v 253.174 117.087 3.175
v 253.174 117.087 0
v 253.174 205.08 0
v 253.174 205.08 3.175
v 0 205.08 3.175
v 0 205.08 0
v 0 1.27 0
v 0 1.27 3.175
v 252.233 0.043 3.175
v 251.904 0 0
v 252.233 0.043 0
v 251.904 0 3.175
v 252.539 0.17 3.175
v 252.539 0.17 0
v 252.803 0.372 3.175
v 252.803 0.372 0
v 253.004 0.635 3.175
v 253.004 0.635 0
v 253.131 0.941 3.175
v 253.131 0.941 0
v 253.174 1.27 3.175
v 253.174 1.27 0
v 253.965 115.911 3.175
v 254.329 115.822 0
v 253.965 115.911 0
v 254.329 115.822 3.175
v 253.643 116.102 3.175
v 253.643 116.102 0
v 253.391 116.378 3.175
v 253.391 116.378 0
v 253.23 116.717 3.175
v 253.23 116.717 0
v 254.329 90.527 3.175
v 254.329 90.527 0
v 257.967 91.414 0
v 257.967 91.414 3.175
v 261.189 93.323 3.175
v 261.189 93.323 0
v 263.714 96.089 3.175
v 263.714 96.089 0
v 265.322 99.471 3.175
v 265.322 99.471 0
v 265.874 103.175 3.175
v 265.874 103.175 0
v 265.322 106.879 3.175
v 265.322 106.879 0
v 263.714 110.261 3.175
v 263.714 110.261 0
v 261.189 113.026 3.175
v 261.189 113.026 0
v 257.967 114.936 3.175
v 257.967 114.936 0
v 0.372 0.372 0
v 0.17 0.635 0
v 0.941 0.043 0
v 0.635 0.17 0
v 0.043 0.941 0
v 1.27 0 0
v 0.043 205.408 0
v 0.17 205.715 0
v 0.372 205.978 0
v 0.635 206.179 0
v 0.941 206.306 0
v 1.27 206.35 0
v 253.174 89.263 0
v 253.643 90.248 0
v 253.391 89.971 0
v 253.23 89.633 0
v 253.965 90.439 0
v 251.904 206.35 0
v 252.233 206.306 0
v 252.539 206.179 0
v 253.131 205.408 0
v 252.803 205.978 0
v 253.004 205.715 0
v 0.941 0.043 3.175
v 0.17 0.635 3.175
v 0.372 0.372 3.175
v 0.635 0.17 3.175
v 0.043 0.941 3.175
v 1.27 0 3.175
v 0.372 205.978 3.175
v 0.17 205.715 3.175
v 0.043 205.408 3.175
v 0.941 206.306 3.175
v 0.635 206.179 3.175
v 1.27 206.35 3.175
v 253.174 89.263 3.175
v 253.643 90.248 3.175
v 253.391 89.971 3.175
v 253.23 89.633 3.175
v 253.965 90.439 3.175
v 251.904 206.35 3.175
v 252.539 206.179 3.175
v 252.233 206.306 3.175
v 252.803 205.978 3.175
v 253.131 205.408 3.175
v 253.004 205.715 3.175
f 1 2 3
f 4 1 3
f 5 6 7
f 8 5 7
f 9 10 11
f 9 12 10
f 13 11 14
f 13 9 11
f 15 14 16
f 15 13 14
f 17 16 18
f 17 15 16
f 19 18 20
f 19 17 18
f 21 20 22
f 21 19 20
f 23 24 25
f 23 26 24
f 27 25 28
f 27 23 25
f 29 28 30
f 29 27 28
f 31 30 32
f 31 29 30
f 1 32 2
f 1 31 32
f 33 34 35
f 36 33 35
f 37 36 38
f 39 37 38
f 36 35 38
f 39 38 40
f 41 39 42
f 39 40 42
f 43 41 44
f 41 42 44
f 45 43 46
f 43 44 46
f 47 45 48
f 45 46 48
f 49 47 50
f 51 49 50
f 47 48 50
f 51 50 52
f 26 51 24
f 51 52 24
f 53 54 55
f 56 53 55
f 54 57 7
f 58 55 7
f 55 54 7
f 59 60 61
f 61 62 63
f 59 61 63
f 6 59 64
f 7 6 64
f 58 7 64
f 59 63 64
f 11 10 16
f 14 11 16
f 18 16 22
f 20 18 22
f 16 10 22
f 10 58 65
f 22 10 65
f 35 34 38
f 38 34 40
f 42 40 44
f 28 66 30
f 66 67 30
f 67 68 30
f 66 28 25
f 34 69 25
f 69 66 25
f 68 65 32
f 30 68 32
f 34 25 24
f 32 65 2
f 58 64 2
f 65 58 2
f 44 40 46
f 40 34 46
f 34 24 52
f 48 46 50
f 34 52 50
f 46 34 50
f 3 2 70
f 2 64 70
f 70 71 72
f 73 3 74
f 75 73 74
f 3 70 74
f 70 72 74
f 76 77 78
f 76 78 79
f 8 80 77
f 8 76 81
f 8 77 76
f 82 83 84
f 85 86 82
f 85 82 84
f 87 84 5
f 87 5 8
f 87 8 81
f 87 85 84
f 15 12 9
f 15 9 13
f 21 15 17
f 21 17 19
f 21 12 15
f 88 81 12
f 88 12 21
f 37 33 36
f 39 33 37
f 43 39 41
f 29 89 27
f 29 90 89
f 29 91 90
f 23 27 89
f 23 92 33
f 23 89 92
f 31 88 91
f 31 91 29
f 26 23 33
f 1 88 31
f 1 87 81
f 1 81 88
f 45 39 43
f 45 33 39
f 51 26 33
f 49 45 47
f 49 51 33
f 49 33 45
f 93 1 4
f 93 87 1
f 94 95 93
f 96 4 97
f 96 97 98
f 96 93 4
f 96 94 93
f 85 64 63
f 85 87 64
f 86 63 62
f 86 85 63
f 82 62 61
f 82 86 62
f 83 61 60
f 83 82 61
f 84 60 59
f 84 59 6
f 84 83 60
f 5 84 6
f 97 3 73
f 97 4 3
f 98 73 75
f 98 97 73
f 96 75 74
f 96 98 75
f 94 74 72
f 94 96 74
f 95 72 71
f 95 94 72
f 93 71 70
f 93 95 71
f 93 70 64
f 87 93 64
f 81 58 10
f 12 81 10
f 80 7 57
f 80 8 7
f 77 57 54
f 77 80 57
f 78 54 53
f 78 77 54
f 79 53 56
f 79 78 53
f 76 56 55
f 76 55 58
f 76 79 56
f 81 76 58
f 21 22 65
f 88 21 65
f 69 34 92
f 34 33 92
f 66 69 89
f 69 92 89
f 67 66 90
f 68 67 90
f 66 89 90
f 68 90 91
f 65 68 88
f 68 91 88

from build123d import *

# Parameters (mm, degrees)
BOSS_EXTRUDE2_DEPTH = 3.175
FILLET1_R           = 1.27


# Read off the part's stored shape, not the designer's step: Boss-Extrude2
with BuildPart() as part:
    # Boss-Extrude2 outline → Boss-Extrude2 (new body)
    with BuildSketch(Plane.XY):
        with BuildLine():
            ThreePointArc((253.1745, 90.4748), (265.8745, 103.1748), (253.1745, 115.8748))
            Line((253.1745, 115.8748), (253.1745, 206.3496))
            Line((253.1745, 206.3496), (0, 206.3496))
            Line((0, 206.3496), (0, 0))
            Line((0, 0), (253.1745, 0))
            Line((253.1745, 0), (253.1745, 90.4748))
        make_face()
    extrude(amount=BOSS_EXTRUDE2_DEPTH)

    # Fillet1
    fillet1_edges = [part.edges().sort_by_distance(p)[0] for p in [
        (253.1745, 90.4748, 1.5875),
        (253.1745, 0, 1.5875),
        (0, 0, 1.5875),
        (0, 206.3496, 1.5875),
        (253.1745, 206.3496, 1.5875),
        (253.1745, 115.8748, 1.5875),
    ]]
    fillet(fillet1_edges, radius=FILLET1_R)


solid = part.part
